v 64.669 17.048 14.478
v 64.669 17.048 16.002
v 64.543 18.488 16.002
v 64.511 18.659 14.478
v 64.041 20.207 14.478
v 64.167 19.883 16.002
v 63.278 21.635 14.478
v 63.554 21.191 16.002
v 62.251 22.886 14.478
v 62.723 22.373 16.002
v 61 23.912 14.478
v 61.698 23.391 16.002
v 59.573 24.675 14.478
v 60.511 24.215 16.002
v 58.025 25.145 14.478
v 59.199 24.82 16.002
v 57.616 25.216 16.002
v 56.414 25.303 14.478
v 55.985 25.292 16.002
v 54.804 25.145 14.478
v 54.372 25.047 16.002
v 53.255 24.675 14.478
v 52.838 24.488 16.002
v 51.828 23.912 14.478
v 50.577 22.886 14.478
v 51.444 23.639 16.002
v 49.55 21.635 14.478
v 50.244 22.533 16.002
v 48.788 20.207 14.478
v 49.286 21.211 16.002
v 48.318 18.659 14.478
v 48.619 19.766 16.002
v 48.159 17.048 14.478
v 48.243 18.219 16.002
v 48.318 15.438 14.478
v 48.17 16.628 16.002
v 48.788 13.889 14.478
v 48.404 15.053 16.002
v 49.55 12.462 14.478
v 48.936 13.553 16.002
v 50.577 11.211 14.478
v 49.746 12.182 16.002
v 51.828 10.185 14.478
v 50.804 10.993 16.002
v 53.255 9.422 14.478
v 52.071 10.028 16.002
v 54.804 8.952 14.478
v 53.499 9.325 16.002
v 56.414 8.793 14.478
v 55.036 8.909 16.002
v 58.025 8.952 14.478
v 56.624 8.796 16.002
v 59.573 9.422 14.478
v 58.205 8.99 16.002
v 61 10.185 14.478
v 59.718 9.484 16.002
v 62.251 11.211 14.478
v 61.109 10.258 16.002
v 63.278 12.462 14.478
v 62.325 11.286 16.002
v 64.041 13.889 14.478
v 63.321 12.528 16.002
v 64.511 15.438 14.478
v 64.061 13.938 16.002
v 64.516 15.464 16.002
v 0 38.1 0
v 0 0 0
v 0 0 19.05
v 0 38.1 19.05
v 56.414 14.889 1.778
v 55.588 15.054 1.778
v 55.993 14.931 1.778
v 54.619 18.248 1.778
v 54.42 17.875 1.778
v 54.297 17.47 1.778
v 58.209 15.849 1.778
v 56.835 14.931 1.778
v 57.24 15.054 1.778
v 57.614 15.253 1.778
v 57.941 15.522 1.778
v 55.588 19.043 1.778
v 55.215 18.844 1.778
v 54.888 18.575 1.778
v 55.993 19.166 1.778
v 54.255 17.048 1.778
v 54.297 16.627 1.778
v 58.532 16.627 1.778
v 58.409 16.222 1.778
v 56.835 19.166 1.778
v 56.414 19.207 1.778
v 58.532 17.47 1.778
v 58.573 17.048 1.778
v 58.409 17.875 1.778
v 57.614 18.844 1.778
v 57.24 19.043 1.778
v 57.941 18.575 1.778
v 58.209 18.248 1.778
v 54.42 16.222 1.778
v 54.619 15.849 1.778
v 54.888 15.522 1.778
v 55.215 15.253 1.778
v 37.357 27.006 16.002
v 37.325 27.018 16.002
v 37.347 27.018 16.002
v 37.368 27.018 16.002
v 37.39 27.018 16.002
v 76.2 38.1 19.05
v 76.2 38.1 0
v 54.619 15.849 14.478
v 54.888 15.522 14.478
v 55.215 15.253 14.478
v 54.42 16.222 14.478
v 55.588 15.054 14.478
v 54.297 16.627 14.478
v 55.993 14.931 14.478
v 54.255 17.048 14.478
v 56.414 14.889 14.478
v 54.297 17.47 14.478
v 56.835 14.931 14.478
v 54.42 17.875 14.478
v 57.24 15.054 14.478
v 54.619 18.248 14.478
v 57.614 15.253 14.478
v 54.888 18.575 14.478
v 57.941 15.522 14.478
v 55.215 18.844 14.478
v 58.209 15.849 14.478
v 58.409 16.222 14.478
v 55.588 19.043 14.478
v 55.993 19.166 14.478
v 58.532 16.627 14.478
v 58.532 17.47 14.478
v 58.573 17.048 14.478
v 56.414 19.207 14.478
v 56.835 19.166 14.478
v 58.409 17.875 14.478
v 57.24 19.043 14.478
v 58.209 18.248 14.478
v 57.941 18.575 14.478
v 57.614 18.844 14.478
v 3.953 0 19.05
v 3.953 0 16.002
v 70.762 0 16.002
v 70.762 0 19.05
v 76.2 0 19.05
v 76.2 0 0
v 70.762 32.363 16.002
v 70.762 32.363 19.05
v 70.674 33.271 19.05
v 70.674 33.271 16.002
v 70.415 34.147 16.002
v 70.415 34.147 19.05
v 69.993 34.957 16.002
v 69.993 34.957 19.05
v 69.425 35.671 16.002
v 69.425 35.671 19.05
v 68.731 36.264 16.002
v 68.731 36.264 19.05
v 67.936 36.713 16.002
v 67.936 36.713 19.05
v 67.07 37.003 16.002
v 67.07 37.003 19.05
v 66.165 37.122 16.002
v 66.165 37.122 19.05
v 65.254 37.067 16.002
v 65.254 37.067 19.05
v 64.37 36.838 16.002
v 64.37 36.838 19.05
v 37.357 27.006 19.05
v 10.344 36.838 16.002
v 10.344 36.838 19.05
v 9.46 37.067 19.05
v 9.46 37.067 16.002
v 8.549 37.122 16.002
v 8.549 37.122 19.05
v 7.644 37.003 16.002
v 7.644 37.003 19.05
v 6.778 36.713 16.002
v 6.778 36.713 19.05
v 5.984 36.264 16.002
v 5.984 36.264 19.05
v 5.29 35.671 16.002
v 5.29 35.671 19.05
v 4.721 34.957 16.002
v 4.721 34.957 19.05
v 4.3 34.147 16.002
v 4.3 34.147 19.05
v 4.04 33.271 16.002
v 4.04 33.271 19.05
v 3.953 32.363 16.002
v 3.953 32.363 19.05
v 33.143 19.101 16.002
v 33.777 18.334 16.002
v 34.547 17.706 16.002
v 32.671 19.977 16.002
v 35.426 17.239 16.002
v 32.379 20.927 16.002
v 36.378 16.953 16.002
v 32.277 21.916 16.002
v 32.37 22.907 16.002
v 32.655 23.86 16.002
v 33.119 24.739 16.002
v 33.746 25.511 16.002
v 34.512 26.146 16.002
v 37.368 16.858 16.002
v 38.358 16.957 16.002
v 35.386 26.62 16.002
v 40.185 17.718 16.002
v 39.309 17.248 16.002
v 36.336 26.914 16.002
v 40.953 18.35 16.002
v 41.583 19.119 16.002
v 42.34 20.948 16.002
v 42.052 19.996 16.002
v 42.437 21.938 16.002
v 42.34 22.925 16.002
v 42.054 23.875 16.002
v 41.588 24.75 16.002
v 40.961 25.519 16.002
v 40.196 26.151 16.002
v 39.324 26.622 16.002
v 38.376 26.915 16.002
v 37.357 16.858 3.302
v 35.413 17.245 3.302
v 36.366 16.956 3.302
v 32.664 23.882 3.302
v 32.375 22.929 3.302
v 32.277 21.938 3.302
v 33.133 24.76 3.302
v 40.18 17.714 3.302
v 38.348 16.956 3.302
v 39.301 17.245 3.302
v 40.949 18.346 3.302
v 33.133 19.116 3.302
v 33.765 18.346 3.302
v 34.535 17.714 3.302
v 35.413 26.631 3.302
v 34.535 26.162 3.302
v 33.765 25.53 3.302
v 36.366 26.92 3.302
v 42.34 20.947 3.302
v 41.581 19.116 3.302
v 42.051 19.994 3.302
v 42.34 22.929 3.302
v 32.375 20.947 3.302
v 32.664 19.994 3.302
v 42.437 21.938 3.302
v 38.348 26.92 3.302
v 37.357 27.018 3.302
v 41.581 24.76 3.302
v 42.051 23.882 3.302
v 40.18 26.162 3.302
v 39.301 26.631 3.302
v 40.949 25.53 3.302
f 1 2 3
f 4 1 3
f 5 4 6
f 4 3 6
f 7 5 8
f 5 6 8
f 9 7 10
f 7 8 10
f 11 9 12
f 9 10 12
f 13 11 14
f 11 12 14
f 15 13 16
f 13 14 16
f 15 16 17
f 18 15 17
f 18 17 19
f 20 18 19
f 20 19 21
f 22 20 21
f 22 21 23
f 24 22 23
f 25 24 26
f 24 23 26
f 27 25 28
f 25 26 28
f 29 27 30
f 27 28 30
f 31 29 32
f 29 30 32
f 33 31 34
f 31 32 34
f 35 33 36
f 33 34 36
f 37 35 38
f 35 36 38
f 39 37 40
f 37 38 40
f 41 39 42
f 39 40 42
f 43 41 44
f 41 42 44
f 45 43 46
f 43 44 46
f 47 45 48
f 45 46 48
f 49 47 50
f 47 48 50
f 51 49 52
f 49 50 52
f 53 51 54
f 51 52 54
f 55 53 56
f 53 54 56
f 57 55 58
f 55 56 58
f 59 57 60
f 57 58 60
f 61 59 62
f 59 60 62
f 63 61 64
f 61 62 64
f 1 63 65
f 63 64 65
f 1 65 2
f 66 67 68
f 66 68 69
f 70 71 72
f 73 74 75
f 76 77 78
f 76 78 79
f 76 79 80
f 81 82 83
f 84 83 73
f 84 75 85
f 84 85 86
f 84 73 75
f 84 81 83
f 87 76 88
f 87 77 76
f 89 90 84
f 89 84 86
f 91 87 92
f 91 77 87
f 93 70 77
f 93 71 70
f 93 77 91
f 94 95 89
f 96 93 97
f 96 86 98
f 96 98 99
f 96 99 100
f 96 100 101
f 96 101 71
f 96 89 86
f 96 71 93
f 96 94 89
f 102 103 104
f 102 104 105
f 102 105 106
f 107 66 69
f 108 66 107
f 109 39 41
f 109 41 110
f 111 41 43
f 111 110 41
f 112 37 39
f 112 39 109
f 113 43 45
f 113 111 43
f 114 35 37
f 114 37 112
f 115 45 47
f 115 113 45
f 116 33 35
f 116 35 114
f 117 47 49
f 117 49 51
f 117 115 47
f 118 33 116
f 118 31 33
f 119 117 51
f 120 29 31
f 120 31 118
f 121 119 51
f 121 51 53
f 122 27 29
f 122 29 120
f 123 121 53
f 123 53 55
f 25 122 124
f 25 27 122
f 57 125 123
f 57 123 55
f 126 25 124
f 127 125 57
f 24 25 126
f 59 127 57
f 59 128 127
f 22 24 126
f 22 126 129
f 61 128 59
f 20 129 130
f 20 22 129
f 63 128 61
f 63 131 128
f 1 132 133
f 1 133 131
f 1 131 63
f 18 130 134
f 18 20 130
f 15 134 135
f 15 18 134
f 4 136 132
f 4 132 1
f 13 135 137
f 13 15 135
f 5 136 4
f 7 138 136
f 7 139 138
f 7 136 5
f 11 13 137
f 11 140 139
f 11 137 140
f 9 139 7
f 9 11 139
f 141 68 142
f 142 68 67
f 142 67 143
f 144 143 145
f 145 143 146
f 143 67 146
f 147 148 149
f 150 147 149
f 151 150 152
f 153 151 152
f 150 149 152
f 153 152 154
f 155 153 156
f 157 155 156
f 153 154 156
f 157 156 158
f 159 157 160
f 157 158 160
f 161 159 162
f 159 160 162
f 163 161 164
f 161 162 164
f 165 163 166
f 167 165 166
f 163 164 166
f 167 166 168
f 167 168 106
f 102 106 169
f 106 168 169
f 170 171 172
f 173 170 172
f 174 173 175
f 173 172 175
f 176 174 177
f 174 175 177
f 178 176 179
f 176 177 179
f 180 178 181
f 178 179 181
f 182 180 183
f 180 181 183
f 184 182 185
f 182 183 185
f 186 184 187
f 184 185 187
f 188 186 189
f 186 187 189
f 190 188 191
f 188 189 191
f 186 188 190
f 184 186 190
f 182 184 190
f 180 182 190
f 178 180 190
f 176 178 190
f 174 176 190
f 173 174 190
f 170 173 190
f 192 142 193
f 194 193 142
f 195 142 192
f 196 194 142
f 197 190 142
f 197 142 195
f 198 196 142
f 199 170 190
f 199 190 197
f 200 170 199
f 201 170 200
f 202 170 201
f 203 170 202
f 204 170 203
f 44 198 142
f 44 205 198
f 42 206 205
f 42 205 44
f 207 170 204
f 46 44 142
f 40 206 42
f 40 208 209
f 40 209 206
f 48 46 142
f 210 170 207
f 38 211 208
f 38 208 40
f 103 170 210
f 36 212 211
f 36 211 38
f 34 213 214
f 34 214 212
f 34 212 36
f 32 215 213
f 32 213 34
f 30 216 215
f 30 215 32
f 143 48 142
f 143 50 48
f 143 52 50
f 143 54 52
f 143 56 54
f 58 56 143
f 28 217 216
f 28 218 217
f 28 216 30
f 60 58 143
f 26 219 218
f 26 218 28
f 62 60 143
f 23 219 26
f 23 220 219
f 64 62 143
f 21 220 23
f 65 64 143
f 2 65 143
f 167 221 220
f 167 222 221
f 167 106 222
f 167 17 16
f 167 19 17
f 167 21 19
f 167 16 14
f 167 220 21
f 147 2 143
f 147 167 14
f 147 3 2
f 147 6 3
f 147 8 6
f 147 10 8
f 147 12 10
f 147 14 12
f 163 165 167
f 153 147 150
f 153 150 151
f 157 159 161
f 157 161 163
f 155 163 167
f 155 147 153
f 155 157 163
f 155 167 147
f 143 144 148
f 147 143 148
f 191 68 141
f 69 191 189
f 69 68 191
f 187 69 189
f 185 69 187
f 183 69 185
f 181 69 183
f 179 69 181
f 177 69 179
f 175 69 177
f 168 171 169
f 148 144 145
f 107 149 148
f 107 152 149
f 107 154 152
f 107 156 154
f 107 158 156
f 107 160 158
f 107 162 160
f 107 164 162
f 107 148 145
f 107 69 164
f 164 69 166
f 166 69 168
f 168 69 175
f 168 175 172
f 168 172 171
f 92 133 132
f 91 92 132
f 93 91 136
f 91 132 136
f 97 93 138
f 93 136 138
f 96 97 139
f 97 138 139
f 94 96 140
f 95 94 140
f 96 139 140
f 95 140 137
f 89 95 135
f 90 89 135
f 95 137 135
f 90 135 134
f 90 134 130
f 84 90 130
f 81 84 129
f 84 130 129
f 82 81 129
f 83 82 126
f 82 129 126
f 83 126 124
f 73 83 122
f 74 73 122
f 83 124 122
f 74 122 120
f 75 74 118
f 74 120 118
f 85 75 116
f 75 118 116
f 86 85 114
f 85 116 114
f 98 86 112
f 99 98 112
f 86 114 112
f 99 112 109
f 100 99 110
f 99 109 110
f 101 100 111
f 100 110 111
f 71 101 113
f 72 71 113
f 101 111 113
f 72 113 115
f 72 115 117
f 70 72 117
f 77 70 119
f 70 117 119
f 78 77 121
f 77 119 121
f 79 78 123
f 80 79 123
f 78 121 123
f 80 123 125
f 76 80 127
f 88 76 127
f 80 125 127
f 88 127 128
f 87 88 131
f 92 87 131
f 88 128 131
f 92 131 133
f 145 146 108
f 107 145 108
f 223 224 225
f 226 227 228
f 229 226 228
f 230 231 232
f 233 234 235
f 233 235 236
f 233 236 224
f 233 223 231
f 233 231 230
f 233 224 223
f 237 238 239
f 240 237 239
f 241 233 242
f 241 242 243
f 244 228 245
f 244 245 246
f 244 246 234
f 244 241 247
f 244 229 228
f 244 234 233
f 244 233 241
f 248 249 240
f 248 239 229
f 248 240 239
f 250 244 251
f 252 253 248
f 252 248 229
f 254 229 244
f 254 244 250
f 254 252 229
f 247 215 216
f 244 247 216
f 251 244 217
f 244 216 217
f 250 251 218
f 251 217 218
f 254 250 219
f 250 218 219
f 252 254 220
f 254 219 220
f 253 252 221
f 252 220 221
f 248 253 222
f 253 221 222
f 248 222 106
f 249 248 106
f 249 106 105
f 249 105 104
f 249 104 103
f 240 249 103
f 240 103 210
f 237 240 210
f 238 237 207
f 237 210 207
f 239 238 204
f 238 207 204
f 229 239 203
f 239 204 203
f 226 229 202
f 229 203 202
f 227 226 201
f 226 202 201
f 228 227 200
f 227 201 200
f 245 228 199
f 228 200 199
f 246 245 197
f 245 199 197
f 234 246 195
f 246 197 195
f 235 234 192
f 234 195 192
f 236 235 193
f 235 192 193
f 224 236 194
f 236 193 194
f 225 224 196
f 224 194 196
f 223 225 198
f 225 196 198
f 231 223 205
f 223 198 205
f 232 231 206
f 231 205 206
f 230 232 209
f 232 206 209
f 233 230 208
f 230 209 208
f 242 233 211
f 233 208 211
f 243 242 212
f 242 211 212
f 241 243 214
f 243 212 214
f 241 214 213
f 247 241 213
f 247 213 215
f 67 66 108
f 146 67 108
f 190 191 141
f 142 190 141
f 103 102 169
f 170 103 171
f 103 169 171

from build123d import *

# Parameters (mm, degrees)
F0_W      = 76.2
F0_H      = 38.1
F1_DEPTH  = 19.05
F3_DEPTH  = 3.048
F4_R      = 8.255
F5_DEPTH  = 4.572
F6_R      = 2.159
F7_DEPTH  = 12.7
F8_R      = 5.08
F9_DEPTH  = 12.7
F11_DEPTH = 3.048


with BuildPart() as f1:
    # F0 (on Top) → F1 (new body)
    with BuildSketch(Plane.XY):
        with Locations((38.1, 19.05)):
            Rectangle(F0_W, F0_H)
    extrude(amount=F1_DEPTH)

    # F2 (on face) → F3 (cut)
    with BuildSketch(Plane.XY.offset(19.05)):
        with BuildLine():
            ThreePointArc((7.0865621097, 27.8874175237), (11.4470908204, 28.4614920193), (13.4779330423, 32.3627036302))
            ThreePointArc((13.4779330423, 32.3627036302), (12.6166446532, 35.0943614084), (10.3443039749, 36.8379897367))
            ThreePointArc((10.3443039749, 36.8379897367), (4.2401469358, 33.9915745628), (7.0865621097, 27.8874175237))
        make_face()
        with BuildLine():
            ThreePointArc((10.3443039749, 36.8379897367), (12.6166446532, 35.0943614084), (13.4779330423, 32.3627036302))
            ThreePointArc((13.4779330423, 32.3627036302), (11.4470908204, 28.4614920193), (7.0865621097, 27.8874175237))
            Line((7.0865621097, 27.8874175237), (35.7283931912, 17.4626435552))
            ThreePointArc((35.7283931912, 17.4626435552), (32.5947641238, 21.9379296617), (35.7283931912, 26.4132157682))
            Line((35.7283931912, 26.4132157682), (37.3572641238, 27.0060763031))
            Line((37.3572641238, 27.0060763031), (10.3443039749, 36.8379897367))
        make_face()
        with BuildLine():
            Line((64.3702242728, 36.8379897367), (37.3572641238, 27.0060763031))
            Line((37.3572641238, 27.0060763031), (38.9861350564, 26.4132157682))
            ThreePointArc((38.9861350564, 26.4132157682), (41.2584757347, 24.6695874398), (42.1197641238, 21.9379296617))
            ThreePointArc((42.1197641238, 21.9379296617), (41.2584757347, 19.2062718836), (38.9861350564, 17.4626435552))
            Line((38.9861350564, 17.4626435552), (67.627966138, 27.8874175237))
            ThreePointArc((67.627966138, 27.8874175237), (61.5238090989, 30.7338326977), (64.3702242728, 36.8379897367))
        make_face()
        with BuildLine():
            Line((38.9861350564, 26.4132157682), (37.3572641238, 27.0060763031))
            Line((37.3572641238, 27.0060763031), (35.7283931912, 26.4132157682))
            ThreePointArc((35.7283931912, 26.4132157682), (37.3572641238, 26.7004296617), (38.9861350564, 26.4132157682))
        make_face()
        with BuildLine():
            ThreePointArc((35.7283931912, 26.4132157682), (32.5947641238, 21.9379296617), (35.7283931912, 17.4626435552))
            ThreePointArc((35.7283931912, 17.4626435552), (37.3572641238, 17.1754296617), (38.9861350564, 17.4626435552))
            ThreePointArc((38.9861350564, 17.4626435552), (41.2584757347, 19.2062718836), (42.1197641238, 21.9379296617))
            ThreePointArc((42.1197641238, 21.9379296617), (41.2584757347, 24.6695874398), (38.9861350564, 26.4132157682))
            ThreePointArc((38.9861350564, 26.4132157682), (37.3572641238, 26.7004296617), (35.7283931912, 26.4132157682))
        make_face()
        with BuildLine():
            ThreePointArc((70.7615952054, 32.3627036302), (68.7307529835, 36.2639152412), (64.3702242728, 36.8379897367))
            ThreePointArc((64.3702242728, 36.8379897367), (61.5238090989, 30.7338326977), (67.627966138, 27.8874175237))
            ThreePointArc((67.627966138, 27.8874175237), (69.9003068163, 29.6310458521), (70.7615952054, 32.3627036302))
        make_face()
    extrude(amount=-F3_DEPTH, mode=Mode.SUBTRACT)

    # F4 (on face) → F5 (cut)
    with BuildSketch(Plane.XY.offset(19.05)):
        with Locations((56.4142079383, 17.0484144696)):
            Circle(F4_R)
    extrude(amount=-F5_DEPTH, mode=Mode.SUBTRACT)

    # F6 (on face) → F7 (cut)
    with BuildSketch(Plane.XY.offset(14.478)):
        with Locations((56.4142079383, 17.0484144696)):
            Circle(F6_R)
    extrude(amount=-F7_DEPTH, mode=Mode.SUBTRACT)

    # F8 (on face) → F9 (cut)
    with BuildSketch(Plane.XY.offset(16.002)):
        with Locations((37.3572641238, 21.9379296617)):
            Circle(F8_R)
    extrude(amount=-F9_DEPTH, mode=Mode.SUBTRACT)

    # F10 (on face) → F11 (cut)
    with BuildSketch(Plane.XY.offset(19.05)):
        with BuildLine():
            ThreePointArc((7.0865621097, 27.8874175237), (4.8142214313, 29.6310458521), (3.9529330423, 32.3627036302))
            Line((3.9529330423, 32.3627036302), (3.9529330423, 0))
            Line((3.9529330423, 0), (70.7615952054, 0))
            Line((70.7615952054, 0), (70.7615952054, 32.3627036302))
            ThreePointArc((70.7615952054, 32.3627036302), (69.9003068163, 29.6310458521), (67.627966138, 27.8874175237))
            Line((67.627966138, 27.8874175237), (59.1989824769, 24.819518366))
            Line((59.1989824769, 24.819518366), (49.2857775794, 21.2114068571))
            Line((49.2857775794, 21.2114068571), (38.9861350564, 17.4626435552))
            ThreePointArc((38.9861350564, 17.4626435552), (37.3572641238, 17.1754296617), (35.7283931912, 17.4626435552))
            Line((35.7283931912, 17.4626435552), (7.0865621097, 27.8874175237))
        make_face()
    extrude(amount=-F11_DEPTH, mode=Mode.SUBTRACT)


solid = f1.part
